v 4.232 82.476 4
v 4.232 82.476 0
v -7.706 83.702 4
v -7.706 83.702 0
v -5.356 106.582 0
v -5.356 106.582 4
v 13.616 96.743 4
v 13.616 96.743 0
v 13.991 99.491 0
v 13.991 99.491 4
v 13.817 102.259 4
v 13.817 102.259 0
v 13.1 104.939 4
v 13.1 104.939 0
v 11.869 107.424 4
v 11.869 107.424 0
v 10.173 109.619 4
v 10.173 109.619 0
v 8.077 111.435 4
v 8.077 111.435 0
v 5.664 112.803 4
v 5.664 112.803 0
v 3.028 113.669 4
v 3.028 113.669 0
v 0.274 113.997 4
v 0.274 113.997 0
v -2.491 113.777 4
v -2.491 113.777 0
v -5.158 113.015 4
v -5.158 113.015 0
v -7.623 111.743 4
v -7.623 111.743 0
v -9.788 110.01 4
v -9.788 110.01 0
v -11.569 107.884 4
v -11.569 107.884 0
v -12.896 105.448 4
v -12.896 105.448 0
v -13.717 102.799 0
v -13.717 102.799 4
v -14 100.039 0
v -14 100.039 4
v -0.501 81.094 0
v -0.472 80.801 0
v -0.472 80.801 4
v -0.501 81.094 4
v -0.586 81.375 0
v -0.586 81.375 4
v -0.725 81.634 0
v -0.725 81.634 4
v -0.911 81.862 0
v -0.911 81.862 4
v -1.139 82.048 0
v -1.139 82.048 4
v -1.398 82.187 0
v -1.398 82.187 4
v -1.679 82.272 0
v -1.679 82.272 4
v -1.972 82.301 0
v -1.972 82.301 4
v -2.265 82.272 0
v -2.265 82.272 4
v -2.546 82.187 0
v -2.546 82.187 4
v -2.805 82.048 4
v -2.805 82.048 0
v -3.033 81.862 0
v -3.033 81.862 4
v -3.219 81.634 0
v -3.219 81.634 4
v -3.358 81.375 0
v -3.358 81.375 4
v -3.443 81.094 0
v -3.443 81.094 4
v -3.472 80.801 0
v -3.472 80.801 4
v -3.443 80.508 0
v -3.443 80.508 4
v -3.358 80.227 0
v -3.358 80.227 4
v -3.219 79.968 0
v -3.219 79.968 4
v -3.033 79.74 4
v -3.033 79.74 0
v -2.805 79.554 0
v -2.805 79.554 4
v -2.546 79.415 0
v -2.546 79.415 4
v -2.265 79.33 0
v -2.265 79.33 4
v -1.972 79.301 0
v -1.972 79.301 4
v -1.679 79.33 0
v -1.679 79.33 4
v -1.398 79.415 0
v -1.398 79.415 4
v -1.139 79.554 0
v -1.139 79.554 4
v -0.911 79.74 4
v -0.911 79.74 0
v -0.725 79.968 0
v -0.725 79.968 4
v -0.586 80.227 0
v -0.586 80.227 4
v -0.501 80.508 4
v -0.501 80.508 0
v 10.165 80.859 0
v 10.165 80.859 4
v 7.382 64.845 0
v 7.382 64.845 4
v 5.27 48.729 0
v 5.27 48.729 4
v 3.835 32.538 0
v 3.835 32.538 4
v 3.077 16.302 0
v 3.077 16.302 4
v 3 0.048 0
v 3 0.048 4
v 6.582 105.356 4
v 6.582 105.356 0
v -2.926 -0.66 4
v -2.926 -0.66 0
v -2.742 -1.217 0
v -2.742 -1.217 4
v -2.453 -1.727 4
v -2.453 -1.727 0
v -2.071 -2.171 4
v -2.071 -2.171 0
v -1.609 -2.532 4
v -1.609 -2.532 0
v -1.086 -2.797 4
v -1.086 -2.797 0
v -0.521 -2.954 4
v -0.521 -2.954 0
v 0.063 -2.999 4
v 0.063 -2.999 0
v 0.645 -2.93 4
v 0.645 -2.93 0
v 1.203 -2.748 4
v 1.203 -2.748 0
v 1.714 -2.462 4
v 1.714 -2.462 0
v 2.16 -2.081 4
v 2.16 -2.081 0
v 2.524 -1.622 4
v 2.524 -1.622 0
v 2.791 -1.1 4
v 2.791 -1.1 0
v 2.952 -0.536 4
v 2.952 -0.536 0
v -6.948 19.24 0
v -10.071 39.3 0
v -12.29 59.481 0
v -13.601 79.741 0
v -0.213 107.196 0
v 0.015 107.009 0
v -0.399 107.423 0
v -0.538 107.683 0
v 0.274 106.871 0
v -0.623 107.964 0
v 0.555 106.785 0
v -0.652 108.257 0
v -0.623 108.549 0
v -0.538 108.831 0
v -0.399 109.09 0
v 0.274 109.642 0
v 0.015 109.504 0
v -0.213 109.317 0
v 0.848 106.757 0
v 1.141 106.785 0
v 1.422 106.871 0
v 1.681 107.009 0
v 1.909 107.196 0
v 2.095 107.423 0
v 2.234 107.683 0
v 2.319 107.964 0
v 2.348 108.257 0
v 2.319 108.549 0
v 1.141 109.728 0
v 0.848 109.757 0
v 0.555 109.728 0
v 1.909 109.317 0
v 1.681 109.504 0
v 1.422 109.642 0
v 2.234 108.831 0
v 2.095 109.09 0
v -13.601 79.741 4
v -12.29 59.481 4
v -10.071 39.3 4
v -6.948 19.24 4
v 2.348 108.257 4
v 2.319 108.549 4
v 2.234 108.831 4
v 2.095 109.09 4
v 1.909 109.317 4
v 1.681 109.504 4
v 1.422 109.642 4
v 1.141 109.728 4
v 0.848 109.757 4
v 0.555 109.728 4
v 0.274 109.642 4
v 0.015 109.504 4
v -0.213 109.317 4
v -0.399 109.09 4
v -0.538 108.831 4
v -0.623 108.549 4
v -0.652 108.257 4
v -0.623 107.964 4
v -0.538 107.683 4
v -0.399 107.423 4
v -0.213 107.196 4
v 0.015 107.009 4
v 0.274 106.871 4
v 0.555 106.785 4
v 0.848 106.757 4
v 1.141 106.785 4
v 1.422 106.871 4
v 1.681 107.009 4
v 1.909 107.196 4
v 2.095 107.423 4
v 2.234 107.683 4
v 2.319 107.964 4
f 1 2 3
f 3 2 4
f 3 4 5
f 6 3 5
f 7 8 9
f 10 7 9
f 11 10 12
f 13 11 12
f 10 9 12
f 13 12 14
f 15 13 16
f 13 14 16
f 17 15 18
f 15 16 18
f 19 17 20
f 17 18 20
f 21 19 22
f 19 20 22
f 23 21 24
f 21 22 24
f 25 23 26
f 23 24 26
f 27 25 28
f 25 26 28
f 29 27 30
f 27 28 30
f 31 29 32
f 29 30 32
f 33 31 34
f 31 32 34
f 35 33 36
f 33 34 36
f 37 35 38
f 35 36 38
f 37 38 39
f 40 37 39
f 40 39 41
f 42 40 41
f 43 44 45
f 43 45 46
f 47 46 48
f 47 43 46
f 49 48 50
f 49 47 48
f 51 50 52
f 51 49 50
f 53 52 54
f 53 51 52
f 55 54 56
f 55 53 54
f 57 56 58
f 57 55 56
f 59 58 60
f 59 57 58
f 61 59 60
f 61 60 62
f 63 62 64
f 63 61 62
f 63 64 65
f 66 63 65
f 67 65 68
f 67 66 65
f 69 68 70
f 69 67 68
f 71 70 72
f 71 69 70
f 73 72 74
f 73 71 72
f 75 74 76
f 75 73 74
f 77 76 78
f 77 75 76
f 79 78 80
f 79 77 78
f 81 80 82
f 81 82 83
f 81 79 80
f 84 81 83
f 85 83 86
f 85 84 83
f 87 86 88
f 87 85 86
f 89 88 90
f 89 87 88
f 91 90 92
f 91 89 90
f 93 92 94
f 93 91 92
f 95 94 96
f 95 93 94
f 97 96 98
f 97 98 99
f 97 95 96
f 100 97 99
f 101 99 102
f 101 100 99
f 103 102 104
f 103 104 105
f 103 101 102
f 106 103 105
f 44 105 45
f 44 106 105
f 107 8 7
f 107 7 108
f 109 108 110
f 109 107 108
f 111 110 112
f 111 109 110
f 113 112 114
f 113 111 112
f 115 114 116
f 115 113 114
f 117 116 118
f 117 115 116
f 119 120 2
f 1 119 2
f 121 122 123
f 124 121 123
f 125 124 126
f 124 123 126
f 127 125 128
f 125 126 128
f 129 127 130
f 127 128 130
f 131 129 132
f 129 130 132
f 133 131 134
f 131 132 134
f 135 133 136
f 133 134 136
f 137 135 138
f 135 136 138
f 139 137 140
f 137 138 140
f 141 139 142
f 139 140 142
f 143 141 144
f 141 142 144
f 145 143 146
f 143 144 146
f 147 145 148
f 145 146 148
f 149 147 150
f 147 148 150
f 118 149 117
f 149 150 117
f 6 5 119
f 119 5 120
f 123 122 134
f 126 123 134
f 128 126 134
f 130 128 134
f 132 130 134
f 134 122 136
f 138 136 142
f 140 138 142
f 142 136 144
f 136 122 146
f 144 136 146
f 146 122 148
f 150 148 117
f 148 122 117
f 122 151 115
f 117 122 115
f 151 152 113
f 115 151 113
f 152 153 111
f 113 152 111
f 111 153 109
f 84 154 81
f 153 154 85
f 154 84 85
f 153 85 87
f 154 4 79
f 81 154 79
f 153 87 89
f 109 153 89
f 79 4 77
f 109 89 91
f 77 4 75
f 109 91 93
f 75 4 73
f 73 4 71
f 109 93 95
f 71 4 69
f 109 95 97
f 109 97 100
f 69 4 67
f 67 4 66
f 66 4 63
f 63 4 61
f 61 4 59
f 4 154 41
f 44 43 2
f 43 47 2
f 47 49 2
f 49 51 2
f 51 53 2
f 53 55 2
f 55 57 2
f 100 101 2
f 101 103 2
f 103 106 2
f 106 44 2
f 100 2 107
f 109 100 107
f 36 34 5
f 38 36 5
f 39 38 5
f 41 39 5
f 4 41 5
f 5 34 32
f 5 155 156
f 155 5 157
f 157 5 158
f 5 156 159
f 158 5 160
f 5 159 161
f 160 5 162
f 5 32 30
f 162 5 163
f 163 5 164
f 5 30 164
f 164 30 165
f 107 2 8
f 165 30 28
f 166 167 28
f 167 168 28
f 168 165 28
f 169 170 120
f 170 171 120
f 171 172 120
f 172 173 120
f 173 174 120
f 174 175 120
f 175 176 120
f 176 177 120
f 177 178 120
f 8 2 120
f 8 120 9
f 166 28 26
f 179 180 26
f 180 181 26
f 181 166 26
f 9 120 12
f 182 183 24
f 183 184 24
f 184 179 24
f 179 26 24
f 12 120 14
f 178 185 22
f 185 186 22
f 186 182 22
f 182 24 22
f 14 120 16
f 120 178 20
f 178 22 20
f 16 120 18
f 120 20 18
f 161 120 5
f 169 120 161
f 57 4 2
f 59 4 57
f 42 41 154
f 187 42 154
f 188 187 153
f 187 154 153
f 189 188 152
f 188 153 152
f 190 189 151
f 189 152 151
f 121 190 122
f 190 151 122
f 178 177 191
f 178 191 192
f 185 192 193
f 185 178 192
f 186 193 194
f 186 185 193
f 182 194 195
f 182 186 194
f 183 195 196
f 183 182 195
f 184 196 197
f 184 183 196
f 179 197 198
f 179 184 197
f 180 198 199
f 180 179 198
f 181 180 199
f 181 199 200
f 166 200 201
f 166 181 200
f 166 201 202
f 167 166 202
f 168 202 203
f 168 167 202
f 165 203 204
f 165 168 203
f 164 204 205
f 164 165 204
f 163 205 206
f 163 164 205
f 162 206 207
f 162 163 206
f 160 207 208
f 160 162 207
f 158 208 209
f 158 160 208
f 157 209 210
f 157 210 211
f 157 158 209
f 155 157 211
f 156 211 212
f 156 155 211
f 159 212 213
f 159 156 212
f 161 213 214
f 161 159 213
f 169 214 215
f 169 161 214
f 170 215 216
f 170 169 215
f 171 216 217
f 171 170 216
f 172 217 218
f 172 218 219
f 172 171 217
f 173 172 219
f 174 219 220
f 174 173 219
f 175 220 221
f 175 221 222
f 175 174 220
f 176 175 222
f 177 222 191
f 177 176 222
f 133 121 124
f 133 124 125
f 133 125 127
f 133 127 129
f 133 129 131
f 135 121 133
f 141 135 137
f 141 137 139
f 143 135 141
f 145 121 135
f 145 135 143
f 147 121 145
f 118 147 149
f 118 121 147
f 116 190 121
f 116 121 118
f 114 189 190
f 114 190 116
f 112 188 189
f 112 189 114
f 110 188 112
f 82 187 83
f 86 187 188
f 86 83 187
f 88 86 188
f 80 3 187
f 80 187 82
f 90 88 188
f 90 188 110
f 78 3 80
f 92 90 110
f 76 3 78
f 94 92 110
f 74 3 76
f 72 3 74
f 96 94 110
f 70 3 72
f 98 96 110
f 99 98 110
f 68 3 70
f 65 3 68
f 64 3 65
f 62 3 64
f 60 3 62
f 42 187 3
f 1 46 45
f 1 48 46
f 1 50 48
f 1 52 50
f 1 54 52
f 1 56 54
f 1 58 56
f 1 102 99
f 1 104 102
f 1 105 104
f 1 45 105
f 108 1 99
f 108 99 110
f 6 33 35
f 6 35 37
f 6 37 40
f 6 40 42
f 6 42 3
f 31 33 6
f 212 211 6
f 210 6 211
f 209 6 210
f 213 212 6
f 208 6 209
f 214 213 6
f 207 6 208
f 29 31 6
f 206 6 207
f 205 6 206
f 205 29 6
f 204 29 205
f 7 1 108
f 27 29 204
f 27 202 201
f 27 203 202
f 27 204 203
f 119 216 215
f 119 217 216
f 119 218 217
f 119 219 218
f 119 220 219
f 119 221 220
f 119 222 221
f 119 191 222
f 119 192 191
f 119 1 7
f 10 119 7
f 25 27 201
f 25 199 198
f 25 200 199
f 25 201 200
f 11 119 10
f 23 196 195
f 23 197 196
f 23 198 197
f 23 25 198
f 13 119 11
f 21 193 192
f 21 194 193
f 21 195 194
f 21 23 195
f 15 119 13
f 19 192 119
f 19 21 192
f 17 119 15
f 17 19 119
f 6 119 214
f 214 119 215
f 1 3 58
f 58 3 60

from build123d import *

# Parameters (mm, degrees)
SKETCH_R  = 1.5
PAD_DEPTH = 4


with BuildPart() as part:
    # Sketch → Pad (new body)
    with BuildSketch(Plane.XY):
        with BuildLine():
            ThreePointArc((13.615765, 96.742557), (1.659489, 113.901298), (-13.999945, 100.039225))
            ThreePointArc((-13.999945, 100.039225), (-11.293951, 49.378275), (-2.926476, -0.660106))
            ThreePointArc((-2.926476, -0.660106), (0.356119, -2.978788), (2.99961, 0.048367))
            ThreePointArc((13.615765, 96.742557), (5.2705, 48.728918), (2.99961, 0.048367))
        make_face()
        with Locations((0.848022, 108.256565)):
            Circle(SKETCH_R, mode=Mode.SUBTRACT)
        with Locations((-1.971907, 80.801)):
            Circle(SKETCH_R, mode=Mode.SUBTRACT)
        Polygon((-5.355573, 106.581629), (6.581629, 105.355573), (4.231688, 82.475936), (-7.705514, 83.701992), align=None, mode=Mode.SUBTRACT)
    extrude(amount=PAD_DEPTH)


solid = part.part
